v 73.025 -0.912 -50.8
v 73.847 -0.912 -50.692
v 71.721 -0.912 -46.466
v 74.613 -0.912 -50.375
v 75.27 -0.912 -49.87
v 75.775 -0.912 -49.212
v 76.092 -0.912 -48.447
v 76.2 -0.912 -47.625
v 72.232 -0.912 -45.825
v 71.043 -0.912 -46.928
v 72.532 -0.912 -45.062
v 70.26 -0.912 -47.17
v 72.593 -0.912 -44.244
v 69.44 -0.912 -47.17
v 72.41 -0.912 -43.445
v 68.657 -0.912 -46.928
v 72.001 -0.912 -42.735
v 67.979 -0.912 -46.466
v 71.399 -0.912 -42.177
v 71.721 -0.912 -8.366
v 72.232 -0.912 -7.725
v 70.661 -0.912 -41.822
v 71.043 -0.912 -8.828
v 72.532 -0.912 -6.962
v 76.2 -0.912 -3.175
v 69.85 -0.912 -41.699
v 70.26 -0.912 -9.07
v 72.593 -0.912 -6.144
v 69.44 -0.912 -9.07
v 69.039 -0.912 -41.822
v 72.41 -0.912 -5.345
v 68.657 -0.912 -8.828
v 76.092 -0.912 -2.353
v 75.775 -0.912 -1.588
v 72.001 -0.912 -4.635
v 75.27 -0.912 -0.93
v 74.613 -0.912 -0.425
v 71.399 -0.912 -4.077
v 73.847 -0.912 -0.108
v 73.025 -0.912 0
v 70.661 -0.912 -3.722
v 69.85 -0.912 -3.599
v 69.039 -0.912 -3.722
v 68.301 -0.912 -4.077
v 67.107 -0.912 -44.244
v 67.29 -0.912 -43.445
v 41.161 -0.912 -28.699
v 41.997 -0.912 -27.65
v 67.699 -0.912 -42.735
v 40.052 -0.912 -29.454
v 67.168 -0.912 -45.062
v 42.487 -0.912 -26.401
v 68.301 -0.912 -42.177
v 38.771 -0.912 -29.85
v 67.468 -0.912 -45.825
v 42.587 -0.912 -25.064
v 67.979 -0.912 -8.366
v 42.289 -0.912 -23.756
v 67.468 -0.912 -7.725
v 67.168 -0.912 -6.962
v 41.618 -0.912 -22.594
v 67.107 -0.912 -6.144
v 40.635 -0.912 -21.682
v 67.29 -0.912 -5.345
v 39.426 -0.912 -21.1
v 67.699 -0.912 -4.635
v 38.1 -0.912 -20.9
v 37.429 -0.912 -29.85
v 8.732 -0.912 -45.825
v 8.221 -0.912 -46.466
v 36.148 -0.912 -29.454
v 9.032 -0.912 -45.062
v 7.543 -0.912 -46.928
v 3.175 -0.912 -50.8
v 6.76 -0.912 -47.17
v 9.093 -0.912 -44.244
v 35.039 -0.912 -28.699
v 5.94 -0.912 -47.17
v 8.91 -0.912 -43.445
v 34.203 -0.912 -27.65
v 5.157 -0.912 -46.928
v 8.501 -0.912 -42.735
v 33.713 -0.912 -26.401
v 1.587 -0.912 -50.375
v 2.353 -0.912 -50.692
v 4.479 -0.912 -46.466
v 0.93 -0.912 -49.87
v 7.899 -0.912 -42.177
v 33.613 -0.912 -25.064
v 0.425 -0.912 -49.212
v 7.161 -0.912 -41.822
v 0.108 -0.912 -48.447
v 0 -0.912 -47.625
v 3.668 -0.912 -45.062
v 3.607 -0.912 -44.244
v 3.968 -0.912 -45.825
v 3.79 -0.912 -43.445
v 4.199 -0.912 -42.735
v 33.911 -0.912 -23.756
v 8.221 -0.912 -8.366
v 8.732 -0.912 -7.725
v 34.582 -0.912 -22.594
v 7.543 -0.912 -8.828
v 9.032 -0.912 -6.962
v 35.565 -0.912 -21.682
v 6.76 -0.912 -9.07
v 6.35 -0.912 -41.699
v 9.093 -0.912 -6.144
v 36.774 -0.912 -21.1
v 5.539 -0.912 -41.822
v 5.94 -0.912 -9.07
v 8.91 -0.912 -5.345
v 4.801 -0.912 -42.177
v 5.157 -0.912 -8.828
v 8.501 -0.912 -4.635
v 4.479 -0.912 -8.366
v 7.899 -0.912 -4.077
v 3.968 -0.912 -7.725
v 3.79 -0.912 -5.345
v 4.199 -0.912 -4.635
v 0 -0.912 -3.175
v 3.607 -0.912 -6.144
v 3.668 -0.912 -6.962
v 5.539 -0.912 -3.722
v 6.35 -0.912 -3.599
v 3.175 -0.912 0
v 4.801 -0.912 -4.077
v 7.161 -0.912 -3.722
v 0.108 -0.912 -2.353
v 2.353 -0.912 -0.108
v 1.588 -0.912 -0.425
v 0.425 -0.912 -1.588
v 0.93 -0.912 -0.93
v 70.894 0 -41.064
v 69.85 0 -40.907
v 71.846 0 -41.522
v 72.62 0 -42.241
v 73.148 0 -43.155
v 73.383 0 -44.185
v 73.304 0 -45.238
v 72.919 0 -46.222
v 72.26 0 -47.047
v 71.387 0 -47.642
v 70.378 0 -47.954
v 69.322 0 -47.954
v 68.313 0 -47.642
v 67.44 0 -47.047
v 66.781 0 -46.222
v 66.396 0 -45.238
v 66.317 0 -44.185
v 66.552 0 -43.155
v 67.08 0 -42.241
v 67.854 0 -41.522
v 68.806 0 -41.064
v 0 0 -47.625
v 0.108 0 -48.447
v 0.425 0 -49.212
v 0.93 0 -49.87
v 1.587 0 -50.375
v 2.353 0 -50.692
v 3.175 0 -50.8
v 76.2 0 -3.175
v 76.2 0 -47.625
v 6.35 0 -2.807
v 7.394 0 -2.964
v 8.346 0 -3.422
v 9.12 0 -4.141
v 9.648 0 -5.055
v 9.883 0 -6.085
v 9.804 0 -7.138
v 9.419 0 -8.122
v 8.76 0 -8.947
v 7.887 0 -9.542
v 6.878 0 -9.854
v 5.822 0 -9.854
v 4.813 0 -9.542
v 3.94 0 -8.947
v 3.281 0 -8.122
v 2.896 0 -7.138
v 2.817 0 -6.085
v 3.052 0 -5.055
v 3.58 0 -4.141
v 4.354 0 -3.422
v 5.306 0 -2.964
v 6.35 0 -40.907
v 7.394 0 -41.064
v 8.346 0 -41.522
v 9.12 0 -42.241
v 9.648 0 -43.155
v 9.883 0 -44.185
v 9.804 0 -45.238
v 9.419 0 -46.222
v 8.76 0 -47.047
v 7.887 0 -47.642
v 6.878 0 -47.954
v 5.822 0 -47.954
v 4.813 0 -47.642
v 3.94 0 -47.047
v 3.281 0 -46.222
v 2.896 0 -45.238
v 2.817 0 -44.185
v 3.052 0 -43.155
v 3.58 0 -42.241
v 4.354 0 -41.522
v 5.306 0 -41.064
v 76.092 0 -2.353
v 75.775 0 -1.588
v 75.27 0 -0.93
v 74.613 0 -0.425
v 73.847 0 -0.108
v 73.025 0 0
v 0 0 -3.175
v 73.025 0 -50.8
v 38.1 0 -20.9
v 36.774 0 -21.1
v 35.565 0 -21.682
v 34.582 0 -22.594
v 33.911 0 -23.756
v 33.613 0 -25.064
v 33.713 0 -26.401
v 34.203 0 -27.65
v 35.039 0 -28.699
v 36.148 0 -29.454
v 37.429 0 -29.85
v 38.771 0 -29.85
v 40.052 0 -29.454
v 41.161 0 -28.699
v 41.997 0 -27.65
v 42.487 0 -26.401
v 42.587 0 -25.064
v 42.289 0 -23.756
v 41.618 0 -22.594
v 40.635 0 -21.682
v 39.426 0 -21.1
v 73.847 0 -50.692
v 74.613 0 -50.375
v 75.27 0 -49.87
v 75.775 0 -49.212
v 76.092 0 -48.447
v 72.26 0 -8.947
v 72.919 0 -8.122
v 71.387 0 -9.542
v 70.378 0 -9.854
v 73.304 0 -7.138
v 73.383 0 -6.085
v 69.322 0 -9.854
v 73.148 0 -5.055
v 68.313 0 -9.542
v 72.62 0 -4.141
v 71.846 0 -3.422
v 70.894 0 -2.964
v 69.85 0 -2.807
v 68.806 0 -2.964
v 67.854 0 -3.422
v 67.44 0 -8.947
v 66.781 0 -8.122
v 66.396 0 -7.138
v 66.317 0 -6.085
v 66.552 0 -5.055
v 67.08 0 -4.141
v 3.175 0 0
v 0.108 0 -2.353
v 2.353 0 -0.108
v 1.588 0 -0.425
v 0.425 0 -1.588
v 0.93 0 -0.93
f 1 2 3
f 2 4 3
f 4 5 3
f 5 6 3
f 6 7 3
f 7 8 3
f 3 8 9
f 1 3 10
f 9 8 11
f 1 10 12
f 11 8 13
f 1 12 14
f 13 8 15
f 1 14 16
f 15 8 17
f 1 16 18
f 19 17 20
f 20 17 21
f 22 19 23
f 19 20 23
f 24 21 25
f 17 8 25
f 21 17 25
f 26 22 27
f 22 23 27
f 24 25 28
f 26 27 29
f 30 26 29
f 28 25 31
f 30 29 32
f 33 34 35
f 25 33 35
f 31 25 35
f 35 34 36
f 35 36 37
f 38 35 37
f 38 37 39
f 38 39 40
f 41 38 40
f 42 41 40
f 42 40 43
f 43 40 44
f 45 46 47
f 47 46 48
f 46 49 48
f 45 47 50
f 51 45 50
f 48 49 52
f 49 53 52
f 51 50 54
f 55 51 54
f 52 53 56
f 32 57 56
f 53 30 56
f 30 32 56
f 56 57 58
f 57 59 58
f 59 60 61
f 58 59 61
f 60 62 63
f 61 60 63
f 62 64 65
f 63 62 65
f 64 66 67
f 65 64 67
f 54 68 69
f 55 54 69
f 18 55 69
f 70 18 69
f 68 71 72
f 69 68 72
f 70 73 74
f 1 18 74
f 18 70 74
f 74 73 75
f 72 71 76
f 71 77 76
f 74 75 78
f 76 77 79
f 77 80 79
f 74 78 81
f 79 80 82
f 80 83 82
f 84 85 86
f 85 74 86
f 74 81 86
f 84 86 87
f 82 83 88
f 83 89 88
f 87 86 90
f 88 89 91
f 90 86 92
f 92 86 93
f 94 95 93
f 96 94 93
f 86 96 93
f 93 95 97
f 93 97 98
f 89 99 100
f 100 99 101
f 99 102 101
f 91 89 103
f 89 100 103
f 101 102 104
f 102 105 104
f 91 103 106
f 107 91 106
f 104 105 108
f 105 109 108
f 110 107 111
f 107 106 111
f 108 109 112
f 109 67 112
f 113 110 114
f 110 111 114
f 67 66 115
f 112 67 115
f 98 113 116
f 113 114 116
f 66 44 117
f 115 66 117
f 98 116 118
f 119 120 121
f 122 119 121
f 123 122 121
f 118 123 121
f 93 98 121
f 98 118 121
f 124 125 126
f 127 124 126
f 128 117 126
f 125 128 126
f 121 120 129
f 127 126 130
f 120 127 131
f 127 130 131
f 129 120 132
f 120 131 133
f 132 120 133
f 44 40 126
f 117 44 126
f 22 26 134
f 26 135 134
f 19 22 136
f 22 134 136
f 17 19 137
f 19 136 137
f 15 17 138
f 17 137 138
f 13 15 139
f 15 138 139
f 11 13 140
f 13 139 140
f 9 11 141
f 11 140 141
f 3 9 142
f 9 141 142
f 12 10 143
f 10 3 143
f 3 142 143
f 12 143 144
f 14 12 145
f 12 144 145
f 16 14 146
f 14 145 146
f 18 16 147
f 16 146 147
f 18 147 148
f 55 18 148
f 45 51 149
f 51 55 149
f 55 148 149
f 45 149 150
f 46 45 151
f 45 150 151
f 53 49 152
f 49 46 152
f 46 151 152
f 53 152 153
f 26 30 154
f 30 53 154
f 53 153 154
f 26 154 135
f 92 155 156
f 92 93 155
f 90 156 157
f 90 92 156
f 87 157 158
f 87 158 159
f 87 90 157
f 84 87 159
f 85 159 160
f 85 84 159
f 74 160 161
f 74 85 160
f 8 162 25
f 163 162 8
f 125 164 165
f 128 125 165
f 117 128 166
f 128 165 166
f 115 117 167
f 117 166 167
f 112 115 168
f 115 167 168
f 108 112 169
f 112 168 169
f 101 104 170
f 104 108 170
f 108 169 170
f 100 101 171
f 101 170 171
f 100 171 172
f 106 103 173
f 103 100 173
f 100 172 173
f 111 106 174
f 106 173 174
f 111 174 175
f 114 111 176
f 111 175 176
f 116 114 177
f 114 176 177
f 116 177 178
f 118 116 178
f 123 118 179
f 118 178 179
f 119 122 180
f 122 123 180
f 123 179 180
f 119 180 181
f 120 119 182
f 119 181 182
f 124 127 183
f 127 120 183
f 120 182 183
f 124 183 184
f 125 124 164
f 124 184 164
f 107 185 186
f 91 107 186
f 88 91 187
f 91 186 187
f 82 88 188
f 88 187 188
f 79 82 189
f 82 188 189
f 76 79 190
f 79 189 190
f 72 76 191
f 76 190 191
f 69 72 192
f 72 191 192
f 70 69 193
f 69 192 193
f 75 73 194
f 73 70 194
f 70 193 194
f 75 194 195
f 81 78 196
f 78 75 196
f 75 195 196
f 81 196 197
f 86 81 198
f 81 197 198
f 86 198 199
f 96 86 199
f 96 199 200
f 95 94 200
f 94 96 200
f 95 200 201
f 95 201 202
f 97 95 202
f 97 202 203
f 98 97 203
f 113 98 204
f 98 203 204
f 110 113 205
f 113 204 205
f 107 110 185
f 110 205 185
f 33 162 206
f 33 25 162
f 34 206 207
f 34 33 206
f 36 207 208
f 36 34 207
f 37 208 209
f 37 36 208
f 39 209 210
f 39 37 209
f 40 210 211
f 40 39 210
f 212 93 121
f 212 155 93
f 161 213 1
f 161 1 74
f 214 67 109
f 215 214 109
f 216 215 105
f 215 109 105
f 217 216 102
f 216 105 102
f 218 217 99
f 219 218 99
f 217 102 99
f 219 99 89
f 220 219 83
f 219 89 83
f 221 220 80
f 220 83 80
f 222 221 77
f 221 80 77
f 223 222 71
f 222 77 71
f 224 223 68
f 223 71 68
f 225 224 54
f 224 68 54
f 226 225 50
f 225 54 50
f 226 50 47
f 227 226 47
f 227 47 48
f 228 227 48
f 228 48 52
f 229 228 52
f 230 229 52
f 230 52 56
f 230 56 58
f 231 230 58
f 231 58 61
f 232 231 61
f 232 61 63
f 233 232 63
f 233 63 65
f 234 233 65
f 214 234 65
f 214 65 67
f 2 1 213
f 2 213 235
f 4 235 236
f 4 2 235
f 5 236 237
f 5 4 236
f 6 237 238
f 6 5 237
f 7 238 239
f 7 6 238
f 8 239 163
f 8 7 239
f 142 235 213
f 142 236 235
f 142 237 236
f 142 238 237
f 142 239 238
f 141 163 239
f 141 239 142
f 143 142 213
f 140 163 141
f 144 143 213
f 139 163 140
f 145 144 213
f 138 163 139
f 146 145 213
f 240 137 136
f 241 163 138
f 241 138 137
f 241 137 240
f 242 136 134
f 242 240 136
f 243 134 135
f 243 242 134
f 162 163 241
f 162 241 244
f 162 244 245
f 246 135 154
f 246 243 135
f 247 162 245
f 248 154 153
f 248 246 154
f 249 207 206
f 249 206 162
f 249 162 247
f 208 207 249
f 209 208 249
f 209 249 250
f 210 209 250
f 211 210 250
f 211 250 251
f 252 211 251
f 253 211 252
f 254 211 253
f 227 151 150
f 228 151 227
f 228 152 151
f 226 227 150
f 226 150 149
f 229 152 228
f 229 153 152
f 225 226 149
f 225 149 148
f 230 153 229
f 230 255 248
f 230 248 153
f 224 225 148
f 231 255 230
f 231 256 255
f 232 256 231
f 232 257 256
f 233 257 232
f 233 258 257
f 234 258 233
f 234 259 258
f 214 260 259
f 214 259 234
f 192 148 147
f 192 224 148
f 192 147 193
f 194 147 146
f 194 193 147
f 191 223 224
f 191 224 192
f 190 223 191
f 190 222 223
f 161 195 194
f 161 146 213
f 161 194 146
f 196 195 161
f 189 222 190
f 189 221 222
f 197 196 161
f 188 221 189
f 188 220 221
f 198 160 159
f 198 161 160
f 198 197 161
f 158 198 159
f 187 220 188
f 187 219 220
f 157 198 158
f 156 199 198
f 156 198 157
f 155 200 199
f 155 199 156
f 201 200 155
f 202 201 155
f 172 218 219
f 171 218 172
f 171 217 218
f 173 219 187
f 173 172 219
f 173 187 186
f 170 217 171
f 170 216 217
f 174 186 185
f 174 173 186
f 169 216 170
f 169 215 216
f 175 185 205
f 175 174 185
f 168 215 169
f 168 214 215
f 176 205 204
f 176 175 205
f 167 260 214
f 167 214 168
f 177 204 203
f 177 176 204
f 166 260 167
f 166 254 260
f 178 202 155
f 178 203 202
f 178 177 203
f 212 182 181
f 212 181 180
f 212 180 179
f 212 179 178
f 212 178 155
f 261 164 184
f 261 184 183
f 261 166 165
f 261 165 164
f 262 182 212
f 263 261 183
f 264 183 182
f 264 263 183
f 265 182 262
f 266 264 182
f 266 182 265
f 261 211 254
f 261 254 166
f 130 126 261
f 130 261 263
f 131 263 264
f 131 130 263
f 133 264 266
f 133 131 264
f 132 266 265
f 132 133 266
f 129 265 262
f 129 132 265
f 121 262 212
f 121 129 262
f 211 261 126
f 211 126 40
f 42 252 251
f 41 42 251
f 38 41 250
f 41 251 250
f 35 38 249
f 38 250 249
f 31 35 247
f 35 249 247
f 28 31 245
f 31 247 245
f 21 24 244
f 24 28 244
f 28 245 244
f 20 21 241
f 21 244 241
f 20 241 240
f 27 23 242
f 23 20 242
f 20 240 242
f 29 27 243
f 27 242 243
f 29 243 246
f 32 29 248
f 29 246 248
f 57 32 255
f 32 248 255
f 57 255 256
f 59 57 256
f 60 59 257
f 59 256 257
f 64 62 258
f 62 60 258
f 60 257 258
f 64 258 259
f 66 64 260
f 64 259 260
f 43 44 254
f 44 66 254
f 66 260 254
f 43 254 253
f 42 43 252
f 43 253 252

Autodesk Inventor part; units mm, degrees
ref_plane "YZ Plane" through (0, 0, 0) normal (1, 0, 0) x (0, 1, 0)
ref_plane "XZ Plane" through (0, 0, 0) normal (0, 1, 0) x (-1, 0, 0)
ref_plane "XY Plane" through (0, 0, 0) normal (0, 0, 1) x (1, 0, 0)
sketch "Sketch1" plane through (0, 0, 0) normal (0, 1, 0) x (-1, 0, 0)
  line L0 (0, 0) -> (-76.2, 0)
  line L1 (-76.2, 0) -> (-76.2, -50.8)
  line L2 (-76.2, -50.8) -> (0, -50.8)
  line L3 (0, -50.8) -> (0, 0)
  line L4 (0, -25.4) -> (-76.2, -25.4)
  line L5 (-38.1, -50.8) -> (-38.1, 0)
  line L6 (-6.35, -44.45) -> (-69.85, -44.45) construction
  line L7 (-69.85, -44.45) -> (-69.85, -6.35) construction
  line L8 (-69.85, -6.35) -> (-6.35, -6.35) construction
  line L9 (-6.35, -6.35) -> (-6.35, -44.45) construction
  line L10 (-6.35, -44.45) -> (-69.85, -6.35) construction
  line L11 (-69.85, -44.45) -> (-6.35, -6.35) construction
  circle A0 centre (-6.35, -44.45) radius 1.5875
  circle A1 centre (-69.85, -44.45) radius 1.5875
  circle A2 centre (-6.35, -6.35) radius 1.5875
  circle A3 centre (-69.85, -6.35) radius 1.5875
  circle A4 centre (-38.1, -25.4) radius 4.5
  dimension "d0" = 76.2
  dimension "d1" = 50.8
  dimension "d2" = 63.5
  dimension "d3" = 38.1
  dimension "d4" = 3.175
  dimension "d13" = 9
extrude "Plate1" add sketch "Sketch1" against normal blind 0.9119 contours L3 L4 A4 L5 L0 | L5 A4 L4 L1 L0 | L3 L2 L5 A4 L4 | A4 L4 L5 | L5 L4 A4 | A4 L5 L4 | L4 A4 L5 L2 L1 | L5 A4 L4 | A0 | A1 | A2 | A3
hole "Mounting Holes" at (6.35, 0, -44.45) at (69.85, 0, -44.45) at (69.85, 0, -6.35) at (6.35, 0, -6.35) direction (0, -1, 0) diameter 3.81 end through all countersink diameter 7.0866 countersink angle 82 clearance for "Flat Head Machine Screw (82)" size "#6" standard "Ansi Unified Screw Threads"
hole "Input Jack Hole" at (38.1, 0, -25.4) direction (0, -1, 0) diameter 9 end through all
fillet "Corner Round1" radius 3.175 4 edges at (0, -0.4559, -50.8) (76.2, -0.4559, -50.8) (76.2, -0.4559, 0) (0, -0.4559, 0)
equation "\"d11\" = Thickness"
equation "\"d5\" = Thickness"
equation "\"BendRadius\" = Thickness"
equation "\"BendReliefWidth\" = Thickness"
equation "\"BendReliefDepth\" = 0.5 * Thickness"
equation "\"CornerReliefSize\" = 4 * Thickness"
equation "\"MinimumRemnant\" = 2 * Thickness"
equation "\"TransitionRadius\" = BendRadius"
equation "\"JacobiRadiusSize\" = BendRadius"
equation "\"GapSize\" = Thickness"
equation "\"Thickness\" = 0.91186"
properties part number "Jack Plate" material "Steel, Carbon"
